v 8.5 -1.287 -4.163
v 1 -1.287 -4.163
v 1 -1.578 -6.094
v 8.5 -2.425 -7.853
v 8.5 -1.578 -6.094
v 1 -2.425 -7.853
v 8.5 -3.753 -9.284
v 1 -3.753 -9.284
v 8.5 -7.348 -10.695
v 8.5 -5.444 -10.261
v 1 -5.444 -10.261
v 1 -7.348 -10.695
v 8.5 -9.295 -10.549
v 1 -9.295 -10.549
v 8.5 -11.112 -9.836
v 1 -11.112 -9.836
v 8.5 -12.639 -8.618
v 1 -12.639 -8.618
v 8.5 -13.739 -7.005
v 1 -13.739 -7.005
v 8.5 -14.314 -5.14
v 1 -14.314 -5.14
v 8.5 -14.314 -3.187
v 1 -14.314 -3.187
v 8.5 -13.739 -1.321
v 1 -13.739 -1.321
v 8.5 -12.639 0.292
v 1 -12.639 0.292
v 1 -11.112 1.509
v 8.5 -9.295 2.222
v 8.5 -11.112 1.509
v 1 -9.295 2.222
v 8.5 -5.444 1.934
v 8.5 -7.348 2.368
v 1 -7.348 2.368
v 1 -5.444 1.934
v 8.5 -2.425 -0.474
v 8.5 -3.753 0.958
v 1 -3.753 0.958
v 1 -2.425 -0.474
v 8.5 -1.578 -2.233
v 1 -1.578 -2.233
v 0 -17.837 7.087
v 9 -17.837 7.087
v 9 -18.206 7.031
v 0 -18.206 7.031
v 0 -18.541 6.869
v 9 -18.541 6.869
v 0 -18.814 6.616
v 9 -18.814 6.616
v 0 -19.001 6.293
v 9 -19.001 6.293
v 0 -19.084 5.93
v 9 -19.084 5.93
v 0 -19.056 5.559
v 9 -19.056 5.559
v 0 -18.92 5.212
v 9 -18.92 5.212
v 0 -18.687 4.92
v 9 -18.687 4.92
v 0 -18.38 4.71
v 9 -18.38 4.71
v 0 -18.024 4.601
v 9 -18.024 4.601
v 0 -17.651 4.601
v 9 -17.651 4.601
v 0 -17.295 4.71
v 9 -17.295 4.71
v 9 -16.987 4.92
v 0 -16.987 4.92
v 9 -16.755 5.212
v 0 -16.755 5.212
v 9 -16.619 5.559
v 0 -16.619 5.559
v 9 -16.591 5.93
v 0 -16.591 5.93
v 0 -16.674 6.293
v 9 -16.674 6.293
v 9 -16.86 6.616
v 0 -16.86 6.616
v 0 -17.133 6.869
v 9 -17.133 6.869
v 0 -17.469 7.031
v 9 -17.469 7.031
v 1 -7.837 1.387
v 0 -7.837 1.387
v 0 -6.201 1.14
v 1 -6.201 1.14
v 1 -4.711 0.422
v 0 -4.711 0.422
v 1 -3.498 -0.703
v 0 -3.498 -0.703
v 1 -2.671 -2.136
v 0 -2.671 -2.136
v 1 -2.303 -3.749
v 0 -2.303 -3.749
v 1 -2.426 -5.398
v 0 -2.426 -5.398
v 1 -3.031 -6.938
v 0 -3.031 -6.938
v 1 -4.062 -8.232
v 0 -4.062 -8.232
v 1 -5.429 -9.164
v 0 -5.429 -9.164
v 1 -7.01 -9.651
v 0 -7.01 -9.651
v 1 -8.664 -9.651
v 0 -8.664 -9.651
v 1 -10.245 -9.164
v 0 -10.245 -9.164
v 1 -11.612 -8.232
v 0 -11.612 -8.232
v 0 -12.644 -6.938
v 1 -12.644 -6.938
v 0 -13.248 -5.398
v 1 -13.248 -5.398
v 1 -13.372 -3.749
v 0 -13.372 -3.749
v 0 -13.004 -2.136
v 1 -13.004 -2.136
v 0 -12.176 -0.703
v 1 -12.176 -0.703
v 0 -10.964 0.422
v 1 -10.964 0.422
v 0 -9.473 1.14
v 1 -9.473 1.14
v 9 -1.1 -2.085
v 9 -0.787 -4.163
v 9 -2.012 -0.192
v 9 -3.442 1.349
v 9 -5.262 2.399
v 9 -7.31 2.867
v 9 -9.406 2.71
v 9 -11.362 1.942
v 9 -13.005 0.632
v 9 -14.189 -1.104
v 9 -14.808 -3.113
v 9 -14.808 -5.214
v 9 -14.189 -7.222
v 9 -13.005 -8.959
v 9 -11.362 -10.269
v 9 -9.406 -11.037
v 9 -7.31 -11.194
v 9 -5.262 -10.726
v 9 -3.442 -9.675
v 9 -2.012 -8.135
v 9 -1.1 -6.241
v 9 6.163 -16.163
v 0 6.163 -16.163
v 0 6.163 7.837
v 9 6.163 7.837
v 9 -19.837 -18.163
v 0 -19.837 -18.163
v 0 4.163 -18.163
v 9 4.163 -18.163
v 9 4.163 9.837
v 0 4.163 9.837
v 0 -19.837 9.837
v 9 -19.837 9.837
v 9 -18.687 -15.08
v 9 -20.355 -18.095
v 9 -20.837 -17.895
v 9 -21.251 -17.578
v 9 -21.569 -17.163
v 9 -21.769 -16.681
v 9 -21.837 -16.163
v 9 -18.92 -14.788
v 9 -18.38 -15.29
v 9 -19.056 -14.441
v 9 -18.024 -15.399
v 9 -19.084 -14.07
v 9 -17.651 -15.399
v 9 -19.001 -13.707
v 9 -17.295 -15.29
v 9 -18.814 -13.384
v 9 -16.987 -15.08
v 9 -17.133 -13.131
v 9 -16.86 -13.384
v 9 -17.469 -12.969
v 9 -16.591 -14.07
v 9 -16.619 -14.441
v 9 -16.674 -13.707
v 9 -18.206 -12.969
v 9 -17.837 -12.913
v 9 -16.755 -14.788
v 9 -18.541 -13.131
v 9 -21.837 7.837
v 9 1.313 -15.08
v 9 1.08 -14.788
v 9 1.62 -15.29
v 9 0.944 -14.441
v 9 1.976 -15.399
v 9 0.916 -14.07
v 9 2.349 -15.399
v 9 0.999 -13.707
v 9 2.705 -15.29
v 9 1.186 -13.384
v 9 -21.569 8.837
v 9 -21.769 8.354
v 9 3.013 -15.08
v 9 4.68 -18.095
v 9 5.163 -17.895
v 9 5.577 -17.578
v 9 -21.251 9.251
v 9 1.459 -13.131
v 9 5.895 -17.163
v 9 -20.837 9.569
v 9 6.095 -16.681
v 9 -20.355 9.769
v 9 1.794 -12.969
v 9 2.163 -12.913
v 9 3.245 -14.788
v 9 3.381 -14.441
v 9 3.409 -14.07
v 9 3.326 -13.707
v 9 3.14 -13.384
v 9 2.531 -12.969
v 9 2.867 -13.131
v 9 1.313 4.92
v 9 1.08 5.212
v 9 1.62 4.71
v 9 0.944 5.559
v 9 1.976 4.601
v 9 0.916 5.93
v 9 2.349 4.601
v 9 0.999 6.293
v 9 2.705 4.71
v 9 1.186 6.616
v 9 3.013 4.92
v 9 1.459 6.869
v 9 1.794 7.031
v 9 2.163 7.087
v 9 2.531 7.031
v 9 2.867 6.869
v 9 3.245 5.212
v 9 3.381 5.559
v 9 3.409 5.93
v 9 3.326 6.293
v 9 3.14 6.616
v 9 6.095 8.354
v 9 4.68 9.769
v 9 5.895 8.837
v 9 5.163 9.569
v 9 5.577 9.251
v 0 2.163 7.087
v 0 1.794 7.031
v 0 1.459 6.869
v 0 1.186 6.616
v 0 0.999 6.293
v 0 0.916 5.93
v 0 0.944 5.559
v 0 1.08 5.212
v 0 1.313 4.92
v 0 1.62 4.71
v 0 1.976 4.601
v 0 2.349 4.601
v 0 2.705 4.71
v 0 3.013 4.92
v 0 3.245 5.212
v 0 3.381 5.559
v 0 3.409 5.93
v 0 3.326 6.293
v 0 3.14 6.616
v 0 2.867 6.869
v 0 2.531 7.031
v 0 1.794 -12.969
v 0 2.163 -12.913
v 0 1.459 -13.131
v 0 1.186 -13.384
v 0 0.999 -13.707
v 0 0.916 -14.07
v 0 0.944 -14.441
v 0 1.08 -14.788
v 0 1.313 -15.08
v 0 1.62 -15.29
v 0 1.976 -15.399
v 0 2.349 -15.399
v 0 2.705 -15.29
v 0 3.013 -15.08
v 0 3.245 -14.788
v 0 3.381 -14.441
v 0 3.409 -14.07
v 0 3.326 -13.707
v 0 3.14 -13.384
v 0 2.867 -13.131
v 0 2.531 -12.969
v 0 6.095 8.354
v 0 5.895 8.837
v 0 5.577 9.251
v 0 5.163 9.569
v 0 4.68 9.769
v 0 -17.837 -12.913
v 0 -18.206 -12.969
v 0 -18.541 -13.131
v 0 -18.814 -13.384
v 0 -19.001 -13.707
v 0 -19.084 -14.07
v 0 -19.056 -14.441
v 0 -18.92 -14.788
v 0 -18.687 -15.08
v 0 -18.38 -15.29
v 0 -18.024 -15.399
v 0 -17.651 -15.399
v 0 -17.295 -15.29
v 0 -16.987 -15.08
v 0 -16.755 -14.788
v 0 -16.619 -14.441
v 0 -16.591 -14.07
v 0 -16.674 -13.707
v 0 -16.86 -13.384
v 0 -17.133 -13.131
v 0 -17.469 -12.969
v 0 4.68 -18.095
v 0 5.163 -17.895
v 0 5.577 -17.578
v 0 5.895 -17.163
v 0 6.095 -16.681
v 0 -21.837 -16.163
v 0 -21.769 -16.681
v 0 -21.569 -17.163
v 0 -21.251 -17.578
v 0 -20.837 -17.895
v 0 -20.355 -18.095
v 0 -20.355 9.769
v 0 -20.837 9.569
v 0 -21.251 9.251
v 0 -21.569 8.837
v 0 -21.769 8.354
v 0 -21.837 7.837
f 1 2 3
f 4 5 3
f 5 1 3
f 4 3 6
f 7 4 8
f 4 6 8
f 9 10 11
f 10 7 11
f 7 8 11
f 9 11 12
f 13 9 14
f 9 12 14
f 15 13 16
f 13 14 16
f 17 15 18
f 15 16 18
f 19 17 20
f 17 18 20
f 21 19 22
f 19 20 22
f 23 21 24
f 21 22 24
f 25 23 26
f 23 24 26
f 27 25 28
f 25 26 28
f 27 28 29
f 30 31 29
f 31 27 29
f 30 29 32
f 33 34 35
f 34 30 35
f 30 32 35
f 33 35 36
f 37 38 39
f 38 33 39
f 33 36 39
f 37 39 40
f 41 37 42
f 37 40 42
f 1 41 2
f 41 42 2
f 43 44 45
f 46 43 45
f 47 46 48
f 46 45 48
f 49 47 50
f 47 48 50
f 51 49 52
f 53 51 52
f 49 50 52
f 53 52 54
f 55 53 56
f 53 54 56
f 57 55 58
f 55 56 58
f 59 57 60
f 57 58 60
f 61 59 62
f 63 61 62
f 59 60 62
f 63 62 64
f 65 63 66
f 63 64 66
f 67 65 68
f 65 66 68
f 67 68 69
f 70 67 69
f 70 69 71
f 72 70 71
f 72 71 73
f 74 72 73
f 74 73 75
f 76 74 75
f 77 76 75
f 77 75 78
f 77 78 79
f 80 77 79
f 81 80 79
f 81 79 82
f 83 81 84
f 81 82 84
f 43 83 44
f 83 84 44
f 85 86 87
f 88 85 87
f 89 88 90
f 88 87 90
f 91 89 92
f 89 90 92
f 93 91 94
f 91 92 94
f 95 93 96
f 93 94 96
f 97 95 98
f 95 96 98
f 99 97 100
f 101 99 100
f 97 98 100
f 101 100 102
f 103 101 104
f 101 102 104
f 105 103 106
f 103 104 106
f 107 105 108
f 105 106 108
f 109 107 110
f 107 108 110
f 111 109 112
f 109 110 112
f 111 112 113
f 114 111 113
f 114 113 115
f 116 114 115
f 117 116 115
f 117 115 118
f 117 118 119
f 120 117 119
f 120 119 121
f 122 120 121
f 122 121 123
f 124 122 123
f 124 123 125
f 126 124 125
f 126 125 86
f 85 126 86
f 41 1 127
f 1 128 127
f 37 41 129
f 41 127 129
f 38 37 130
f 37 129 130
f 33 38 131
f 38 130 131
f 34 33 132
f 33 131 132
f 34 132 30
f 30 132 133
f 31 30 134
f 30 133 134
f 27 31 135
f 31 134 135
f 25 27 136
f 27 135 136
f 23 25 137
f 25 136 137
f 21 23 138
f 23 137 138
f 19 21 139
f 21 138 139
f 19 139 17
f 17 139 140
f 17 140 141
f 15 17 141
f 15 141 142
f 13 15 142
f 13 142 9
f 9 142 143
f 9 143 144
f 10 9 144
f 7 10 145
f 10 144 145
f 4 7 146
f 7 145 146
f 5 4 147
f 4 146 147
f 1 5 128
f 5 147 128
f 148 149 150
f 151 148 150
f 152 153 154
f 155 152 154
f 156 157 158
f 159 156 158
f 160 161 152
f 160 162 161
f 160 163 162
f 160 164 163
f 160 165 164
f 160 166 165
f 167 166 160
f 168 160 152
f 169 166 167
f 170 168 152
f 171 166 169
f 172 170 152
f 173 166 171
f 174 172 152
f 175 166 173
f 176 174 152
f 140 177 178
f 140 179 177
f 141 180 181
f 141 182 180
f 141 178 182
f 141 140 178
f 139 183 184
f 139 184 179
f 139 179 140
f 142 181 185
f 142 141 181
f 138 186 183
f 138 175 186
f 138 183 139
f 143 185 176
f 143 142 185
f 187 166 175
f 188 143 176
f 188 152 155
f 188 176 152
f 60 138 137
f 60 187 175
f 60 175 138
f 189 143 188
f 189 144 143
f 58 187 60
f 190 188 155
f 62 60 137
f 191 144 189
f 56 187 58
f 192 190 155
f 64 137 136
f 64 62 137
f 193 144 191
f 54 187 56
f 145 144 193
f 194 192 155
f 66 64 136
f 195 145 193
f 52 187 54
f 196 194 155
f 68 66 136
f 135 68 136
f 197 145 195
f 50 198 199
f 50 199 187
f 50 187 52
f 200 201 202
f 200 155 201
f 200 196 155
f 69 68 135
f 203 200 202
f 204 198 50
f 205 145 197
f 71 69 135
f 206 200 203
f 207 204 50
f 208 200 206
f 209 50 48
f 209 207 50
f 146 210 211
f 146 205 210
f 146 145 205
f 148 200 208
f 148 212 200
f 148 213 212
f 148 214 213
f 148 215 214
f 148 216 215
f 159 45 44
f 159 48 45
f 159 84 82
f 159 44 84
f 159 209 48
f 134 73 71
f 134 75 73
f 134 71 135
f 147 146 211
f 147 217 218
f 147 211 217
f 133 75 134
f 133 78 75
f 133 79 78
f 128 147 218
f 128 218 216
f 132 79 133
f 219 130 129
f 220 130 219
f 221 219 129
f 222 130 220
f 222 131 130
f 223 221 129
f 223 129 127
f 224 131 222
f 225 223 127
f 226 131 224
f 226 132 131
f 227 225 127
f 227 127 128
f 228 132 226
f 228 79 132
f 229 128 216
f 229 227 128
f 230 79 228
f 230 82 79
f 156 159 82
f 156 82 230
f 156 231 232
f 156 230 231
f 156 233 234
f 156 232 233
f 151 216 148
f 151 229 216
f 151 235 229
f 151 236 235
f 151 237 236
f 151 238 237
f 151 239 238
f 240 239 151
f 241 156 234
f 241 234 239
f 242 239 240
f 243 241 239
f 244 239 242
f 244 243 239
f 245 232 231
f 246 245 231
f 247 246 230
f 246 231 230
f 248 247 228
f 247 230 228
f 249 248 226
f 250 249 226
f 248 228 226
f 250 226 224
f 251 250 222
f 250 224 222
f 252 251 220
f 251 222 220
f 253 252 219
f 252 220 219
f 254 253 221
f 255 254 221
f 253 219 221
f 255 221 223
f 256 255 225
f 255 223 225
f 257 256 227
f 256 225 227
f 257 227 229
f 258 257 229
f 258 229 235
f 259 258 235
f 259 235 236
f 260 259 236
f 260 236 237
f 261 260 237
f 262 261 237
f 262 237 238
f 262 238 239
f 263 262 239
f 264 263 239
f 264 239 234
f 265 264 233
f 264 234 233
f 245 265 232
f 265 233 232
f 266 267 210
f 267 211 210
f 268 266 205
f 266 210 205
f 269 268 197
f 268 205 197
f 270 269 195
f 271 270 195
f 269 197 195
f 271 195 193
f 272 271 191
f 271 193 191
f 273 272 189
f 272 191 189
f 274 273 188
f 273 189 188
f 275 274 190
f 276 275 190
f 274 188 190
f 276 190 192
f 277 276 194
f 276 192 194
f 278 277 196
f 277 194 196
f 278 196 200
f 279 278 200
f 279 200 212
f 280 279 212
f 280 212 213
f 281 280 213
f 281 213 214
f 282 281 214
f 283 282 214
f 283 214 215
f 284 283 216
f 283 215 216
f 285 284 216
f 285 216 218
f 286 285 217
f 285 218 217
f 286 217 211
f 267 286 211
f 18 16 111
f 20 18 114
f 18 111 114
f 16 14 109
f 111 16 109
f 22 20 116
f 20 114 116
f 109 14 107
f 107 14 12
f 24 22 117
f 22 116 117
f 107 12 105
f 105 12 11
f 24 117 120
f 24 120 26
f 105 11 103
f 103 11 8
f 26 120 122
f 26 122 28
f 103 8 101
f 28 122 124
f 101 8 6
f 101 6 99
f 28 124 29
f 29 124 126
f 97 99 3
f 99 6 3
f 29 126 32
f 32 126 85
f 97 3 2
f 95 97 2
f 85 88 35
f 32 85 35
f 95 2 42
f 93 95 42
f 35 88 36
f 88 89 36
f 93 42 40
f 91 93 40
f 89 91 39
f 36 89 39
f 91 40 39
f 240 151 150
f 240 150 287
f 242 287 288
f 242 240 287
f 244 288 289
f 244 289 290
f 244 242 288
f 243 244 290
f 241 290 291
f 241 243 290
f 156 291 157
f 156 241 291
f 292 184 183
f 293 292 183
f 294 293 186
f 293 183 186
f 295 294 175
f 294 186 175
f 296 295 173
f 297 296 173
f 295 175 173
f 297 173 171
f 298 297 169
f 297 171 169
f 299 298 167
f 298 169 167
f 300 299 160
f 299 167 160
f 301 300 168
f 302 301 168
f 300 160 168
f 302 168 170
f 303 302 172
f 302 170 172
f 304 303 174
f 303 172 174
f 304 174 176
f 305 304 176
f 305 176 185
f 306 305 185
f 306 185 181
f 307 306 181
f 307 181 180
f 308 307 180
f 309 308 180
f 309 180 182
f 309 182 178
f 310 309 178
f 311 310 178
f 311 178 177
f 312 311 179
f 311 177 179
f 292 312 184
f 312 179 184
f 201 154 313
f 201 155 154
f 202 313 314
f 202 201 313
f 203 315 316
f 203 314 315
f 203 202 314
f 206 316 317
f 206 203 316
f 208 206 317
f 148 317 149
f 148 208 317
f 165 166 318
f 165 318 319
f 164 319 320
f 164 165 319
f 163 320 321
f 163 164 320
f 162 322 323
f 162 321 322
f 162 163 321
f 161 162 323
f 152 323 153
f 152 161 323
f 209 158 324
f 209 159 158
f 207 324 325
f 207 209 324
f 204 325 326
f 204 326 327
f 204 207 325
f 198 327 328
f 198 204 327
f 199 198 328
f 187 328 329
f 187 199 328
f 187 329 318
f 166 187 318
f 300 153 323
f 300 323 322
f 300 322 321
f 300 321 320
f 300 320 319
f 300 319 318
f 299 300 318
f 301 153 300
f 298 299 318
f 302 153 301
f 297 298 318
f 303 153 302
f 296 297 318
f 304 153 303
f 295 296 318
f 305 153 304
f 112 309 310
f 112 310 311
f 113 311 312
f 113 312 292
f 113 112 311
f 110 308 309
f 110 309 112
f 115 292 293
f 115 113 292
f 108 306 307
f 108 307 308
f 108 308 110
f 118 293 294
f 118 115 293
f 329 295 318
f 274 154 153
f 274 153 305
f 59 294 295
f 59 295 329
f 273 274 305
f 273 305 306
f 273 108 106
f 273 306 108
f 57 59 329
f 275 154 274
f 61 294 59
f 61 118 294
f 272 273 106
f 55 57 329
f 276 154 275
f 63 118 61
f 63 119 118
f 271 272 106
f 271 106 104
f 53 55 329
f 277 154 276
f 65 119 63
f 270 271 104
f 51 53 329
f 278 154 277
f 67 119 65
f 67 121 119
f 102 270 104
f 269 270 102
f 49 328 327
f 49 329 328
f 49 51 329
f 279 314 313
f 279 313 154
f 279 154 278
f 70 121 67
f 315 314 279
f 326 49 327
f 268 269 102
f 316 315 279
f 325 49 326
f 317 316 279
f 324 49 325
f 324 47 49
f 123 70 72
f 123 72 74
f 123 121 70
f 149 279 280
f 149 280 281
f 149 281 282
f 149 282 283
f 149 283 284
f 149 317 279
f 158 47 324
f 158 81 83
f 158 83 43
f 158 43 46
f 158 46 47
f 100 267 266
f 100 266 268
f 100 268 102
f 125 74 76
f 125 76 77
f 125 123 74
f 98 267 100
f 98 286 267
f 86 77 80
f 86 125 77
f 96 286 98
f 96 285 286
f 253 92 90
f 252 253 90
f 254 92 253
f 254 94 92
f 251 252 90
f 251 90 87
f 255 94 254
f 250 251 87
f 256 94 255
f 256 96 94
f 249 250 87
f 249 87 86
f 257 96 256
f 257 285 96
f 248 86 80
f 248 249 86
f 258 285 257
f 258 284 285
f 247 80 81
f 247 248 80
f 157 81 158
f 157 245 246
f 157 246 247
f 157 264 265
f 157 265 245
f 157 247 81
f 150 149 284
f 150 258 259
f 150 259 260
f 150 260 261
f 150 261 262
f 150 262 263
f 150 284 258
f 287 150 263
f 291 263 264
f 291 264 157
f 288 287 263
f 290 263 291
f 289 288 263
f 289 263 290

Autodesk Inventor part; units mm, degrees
ref_plane "YZ Plane" through (0, 0, 0) normal (1, 0, 0) x (0, 1, 0)
ref_plane "XZ Plane" through (0, 0, 0) normal (0, 1, 0) x (-1, 0, 0)
ref_plane "XY Plane" through (0, 0, 0) normal (0, 0, 1) x (1, 0, 0)
sketch "Sketch1" plane through (0, 0, 0) normal (1, 0, 0) x (0, 1, 0)
  line L0 (6.1628, 9.8367) -> (-21.8372, 9.8367)
  line L1 (-21.8372, 9.8367) -> (-21.8372, -18.1633)
  line L2 (-21.8372, -18.1633) -> (6.1628, -18.1633)
  line L3 (6.1628, -18.1633) -> (6.1628, 9.8367)
  circle A0 centre (-7.8372, -4.1633) radius 6.55
  point P0 (0, 0)
  point P1 (2.1628, 5.8367)
  point P2 (-17.8372, 5.8367)
  point P3 (-17.8372, -14.1633)
  point P4 (2.1628, -14.1633)
  dimension "d0" = 28
  dimension "d1" = 28
  dimension "d2" = 20
  dimension "d3" = 20
  dimension "d4" = 4
  dimension "d5" = 4
  dimension "d6" = 14
  dimension "d7" = 14
  dimension "d8" = 13.1
extrude "Extrusion1" add sketch "Sketch1" along normal blind 9
hole "Hole1" at (0, 2.1628, 5.8367) at (0, -17.8372, 5.8367) at (0, -17.8372, -14.1633) at (0, 2.1628, -14.1633) direction (1, 0, 0) diameter 2.5 end through all
sketch "Sketch2" plane through (0, 0, 0) normal (-1, 0, 0) x (0, 0, 1)
  circle A0 centre (-14.1633, -17.8372) radius 1.25 projected
  circle A1 centre (5.8367, 2.1628) radius 1.25 projected
  circle A2 centre (5.8367, -17.8372) radius 1.25 projected
  circle A3 centre (-14.1633, 2.1628) radius 1.25 projected
  circle A4 centre (-4.1633, -7.8372) radius 6.55 projected
  line L0 (9.8367, 6.1628) -> (9.8367, -21.8372) projected
  line L1 (-18.1633, 6.1628) -> (9.8367, 6.1628) projected
  line L2 (-18.1633, -21.8372) -> (-18.1633, 6.1628) projected
  line L3 (9.8367, -21.8372) -> (-18.1633, -21.8372) projected
  circle A5 centre (-4.1633, -7.8372) radius 5.55
  point P0 (0, 0)
  dimension "d18" = 1
extrude "Extrusion2" add sketch "Sketch2" against normal blind 1 contours A4
fillet "Fillet1" radius 2 4 edges at (4.5, -21.8372, 9.8367) (4.5, 6.1628, 9.8367) (4.5, -21.8372, -18.1633) (4.5, 6.1628, -18.1633)
chamfer "Chamfer1" distance 0.5 angle 45 1 edges at (9, -14.3872, -4.1633)
properties part number "3DP_PLA_X_axis_idler_bearing_block" material "ABS Plastic"
